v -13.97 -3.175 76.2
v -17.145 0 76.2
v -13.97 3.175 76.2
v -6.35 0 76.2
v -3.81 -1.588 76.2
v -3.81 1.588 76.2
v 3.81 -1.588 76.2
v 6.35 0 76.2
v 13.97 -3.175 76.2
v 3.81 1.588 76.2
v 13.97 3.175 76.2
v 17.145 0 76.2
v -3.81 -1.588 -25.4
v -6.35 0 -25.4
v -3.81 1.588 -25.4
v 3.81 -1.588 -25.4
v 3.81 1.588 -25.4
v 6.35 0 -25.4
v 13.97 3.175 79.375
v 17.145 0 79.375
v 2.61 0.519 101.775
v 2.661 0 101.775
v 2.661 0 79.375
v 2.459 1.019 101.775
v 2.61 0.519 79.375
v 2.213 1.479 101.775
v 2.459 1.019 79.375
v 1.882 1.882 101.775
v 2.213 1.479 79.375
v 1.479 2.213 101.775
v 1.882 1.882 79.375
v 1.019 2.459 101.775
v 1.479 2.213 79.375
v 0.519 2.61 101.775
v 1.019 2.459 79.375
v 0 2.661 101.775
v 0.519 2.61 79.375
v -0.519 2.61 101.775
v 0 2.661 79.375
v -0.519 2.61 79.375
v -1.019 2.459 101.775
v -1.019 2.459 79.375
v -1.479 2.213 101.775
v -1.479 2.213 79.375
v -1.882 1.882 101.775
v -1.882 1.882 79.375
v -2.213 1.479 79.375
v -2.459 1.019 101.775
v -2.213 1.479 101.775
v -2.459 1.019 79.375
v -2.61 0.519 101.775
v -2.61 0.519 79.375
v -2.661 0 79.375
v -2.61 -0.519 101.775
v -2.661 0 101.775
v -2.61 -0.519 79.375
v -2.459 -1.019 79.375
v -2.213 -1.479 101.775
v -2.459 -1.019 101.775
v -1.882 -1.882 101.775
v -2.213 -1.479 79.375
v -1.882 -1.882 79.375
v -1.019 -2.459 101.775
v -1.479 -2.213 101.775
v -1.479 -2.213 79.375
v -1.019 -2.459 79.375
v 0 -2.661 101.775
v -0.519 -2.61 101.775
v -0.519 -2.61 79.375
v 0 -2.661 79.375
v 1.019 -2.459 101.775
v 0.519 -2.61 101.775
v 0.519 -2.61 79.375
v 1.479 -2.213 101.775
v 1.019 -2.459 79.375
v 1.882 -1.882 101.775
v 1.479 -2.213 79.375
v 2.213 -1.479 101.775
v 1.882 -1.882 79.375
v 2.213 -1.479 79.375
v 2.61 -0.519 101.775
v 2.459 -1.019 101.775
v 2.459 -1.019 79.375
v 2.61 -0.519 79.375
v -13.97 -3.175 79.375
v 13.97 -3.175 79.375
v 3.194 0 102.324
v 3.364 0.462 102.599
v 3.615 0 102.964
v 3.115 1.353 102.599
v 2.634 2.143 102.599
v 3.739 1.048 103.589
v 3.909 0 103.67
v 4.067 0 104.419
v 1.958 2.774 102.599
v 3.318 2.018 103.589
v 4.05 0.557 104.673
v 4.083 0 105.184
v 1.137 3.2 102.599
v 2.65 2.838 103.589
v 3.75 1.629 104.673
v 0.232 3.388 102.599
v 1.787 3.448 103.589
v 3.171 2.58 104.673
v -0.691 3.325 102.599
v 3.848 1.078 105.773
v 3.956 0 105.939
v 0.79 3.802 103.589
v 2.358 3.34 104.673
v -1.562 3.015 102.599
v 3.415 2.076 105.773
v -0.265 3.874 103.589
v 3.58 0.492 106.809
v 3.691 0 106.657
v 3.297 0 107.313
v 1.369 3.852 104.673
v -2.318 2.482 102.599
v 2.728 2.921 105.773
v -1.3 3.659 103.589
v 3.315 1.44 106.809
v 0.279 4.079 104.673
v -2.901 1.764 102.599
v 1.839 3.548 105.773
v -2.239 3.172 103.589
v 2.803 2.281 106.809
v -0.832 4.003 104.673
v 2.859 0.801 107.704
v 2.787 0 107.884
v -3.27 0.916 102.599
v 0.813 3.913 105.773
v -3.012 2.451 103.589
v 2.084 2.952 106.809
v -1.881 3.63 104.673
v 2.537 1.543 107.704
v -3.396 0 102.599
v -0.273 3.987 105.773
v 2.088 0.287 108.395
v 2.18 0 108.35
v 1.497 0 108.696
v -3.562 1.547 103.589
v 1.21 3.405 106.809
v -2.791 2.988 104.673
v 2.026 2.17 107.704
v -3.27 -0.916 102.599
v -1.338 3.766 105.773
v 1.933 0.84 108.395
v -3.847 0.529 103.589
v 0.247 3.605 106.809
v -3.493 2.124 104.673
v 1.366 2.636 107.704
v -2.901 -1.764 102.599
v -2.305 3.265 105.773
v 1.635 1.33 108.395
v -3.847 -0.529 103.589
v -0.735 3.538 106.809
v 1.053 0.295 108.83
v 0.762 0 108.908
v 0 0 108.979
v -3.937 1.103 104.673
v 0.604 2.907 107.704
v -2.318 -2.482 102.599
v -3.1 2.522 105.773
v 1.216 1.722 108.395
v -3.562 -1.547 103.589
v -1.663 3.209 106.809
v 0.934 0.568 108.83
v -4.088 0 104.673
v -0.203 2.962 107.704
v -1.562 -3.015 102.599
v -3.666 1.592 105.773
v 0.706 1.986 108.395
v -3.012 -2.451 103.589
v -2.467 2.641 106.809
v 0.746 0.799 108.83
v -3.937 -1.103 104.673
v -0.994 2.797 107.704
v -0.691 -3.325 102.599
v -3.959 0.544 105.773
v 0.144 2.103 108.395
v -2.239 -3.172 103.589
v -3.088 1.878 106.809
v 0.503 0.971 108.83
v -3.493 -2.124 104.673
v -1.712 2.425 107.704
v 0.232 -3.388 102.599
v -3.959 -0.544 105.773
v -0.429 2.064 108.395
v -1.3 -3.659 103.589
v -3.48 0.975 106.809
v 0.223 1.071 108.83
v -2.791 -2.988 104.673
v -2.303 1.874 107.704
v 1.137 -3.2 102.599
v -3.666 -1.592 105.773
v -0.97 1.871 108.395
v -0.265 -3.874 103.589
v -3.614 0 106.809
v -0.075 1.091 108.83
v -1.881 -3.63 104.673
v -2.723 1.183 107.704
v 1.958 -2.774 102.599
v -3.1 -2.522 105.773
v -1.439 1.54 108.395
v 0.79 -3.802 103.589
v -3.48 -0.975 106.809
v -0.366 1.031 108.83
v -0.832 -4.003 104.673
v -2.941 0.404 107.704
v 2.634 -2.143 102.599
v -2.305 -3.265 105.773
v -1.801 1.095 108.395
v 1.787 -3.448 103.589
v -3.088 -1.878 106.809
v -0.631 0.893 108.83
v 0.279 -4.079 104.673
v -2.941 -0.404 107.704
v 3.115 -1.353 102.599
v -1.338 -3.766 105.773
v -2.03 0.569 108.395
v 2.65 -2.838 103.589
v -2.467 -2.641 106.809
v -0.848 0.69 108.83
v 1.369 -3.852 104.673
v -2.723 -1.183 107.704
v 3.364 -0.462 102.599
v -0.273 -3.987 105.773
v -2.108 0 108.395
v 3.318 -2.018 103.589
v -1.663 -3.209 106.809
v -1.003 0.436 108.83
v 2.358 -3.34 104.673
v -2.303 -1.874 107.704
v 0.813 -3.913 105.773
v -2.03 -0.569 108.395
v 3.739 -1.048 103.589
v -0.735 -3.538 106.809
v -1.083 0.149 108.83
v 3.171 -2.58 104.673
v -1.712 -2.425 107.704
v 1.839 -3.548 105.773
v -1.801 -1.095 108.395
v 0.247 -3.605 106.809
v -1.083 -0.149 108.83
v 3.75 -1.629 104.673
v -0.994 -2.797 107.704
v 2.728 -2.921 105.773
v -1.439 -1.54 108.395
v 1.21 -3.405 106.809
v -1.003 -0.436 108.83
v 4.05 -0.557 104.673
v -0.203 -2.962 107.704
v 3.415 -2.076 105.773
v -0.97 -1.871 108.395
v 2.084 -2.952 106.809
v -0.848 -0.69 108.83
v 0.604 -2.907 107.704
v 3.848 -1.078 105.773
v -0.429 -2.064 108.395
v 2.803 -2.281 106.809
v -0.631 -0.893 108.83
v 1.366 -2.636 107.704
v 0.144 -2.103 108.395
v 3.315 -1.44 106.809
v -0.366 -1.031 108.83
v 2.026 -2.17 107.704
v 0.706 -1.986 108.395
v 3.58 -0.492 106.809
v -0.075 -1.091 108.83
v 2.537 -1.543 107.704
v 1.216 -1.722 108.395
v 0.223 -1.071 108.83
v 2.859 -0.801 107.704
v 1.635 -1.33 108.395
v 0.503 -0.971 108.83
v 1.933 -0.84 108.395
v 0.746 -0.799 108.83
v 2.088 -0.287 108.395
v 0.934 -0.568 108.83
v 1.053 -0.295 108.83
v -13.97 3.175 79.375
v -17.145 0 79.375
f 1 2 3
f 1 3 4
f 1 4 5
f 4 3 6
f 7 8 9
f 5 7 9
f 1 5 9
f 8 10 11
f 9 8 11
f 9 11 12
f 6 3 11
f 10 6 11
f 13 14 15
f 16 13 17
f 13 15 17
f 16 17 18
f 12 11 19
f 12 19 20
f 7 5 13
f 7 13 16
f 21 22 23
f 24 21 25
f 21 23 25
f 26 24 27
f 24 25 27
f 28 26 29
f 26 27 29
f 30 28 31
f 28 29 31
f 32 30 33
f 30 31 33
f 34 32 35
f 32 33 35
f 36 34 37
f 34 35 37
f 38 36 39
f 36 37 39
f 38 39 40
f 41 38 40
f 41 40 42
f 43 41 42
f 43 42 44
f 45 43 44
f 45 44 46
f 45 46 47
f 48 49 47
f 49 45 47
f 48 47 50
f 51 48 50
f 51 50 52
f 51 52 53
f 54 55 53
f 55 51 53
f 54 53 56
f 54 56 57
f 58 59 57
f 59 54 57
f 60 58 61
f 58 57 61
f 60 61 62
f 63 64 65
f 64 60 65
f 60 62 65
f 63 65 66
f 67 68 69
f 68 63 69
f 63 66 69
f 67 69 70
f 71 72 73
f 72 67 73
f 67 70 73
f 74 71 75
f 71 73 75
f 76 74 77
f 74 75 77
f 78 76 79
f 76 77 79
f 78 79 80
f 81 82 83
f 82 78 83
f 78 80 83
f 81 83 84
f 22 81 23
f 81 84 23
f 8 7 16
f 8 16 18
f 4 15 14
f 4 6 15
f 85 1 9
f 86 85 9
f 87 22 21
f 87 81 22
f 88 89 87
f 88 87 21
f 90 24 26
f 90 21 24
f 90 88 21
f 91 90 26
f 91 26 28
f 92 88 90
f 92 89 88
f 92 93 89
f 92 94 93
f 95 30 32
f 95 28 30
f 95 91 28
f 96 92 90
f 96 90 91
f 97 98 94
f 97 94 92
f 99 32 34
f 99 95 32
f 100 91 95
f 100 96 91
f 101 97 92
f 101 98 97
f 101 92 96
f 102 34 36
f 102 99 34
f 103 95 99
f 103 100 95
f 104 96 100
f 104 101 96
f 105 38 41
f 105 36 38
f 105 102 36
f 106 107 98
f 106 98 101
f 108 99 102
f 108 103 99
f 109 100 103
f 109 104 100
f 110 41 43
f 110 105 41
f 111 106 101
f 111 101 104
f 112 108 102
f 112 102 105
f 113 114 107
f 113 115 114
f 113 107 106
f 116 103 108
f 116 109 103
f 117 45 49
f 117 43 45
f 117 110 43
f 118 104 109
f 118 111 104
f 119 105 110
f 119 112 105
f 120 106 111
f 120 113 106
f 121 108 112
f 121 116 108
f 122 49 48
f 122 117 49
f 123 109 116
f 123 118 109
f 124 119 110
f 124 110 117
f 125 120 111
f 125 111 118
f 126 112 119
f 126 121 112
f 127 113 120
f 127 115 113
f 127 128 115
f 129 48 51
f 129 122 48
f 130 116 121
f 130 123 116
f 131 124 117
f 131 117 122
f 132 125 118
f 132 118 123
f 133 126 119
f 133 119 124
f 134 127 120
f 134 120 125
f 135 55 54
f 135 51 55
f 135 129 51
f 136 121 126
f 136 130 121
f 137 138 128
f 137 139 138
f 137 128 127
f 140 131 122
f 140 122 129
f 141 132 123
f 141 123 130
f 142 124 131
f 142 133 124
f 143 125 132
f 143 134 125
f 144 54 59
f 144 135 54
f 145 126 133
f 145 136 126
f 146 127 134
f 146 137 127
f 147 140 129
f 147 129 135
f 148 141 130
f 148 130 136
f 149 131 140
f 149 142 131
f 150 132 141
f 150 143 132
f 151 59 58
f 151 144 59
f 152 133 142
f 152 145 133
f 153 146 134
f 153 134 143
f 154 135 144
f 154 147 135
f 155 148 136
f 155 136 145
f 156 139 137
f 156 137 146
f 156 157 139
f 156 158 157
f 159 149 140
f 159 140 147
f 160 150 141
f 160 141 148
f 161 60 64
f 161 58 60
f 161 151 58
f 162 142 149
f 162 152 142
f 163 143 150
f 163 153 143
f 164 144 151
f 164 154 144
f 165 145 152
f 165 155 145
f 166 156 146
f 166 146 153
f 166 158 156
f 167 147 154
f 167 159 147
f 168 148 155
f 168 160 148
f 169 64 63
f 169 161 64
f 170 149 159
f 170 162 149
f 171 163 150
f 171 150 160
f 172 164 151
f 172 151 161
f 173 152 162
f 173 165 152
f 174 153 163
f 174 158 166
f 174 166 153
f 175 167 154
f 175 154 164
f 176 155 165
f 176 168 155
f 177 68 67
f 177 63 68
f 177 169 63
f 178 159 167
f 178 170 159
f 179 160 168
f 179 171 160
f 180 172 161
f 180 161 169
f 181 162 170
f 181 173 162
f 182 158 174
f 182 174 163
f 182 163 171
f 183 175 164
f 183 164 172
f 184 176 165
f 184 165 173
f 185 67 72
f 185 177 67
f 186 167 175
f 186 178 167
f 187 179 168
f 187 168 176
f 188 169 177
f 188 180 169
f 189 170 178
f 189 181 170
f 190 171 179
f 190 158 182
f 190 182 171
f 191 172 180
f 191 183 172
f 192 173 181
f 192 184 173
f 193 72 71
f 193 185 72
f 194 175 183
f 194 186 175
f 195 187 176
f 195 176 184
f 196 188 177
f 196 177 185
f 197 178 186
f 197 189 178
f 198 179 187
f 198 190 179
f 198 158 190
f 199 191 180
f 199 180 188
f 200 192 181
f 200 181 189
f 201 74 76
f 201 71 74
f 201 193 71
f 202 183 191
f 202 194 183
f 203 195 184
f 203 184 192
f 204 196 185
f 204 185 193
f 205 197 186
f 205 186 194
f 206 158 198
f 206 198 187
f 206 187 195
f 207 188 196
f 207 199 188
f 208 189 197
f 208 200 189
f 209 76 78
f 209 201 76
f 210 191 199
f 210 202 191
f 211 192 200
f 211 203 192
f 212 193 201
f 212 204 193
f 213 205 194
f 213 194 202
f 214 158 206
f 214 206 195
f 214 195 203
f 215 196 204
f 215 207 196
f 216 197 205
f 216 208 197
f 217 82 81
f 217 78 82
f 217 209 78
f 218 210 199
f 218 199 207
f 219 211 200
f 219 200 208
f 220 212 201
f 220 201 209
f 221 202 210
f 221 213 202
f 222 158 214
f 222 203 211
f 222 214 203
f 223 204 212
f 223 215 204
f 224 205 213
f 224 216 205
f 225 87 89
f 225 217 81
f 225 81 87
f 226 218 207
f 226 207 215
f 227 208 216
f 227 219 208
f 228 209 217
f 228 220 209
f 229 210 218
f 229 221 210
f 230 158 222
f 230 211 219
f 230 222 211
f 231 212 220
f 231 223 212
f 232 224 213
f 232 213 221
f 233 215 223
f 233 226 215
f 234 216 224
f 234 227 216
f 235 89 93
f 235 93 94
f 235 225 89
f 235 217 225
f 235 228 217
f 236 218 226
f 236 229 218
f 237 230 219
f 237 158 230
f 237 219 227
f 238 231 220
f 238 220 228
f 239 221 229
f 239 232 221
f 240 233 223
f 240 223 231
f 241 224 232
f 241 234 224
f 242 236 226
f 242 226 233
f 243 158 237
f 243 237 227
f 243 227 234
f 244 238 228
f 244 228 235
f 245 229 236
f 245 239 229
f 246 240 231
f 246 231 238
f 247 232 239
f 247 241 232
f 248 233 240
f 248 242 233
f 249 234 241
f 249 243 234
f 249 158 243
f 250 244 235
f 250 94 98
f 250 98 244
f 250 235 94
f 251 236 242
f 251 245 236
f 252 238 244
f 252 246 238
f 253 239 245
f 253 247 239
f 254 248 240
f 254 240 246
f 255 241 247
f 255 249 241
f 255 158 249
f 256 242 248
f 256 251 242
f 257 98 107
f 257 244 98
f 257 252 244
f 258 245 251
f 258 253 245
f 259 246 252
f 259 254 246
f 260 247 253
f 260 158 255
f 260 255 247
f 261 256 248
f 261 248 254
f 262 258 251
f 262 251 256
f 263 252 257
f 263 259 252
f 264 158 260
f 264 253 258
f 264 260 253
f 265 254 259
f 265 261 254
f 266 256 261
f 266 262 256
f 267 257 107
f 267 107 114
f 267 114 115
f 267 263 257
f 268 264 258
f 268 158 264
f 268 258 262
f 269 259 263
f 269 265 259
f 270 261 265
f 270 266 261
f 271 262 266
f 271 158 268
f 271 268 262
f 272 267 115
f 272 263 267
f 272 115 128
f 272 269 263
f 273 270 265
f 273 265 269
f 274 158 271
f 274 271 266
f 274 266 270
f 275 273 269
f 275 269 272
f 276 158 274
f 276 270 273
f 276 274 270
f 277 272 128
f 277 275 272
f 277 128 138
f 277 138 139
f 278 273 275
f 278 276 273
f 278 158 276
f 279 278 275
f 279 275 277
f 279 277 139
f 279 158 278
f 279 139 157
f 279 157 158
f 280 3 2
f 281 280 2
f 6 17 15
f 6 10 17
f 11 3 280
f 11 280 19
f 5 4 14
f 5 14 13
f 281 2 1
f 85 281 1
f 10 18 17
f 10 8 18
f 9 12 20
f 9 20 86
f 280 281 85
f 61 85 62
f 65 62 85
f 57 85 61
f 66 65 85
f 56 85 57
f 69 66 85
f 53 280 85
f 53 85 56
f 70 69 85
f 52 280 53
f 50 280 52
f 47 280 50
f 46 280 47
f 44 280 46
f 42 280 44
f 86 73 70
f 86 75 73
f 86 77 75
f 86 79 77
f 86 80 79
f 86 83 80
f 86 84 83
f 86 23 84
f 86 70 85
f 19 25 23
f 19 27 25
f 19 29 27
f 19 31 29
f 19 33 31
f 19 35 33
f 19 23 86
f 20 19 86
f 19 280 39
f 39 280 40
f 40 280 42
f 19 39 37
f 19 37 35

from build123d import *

# Parameters (mm, degrees)
F1_DEPTH    = 76.2
F2_W        = 38.1
F2_H        = 6.35
F3_DEPTH    = 3.175
F4_T1_DEPTH = 29.3032991577
F5_R        = 2.6614768155
F6_DEPTH    = 25.4
F10_DEPTH   = 25.4


# Not quite as in the source:
# - a fillet or chamfer that OpenCascade refuses, or shapes differently, is made with other operations: its cross-section is extruded or revolved along the edge and cut away or added


with BuildPart() as f1:
    # F0 (on Top) → F1 (new body)
    with BuildSketch(Plane.XY):
        Polygon((0, 1.5875), (-3.81, 1.5875), (-6.35, 0), (-3.81, -1.5875), (0, -1.5875), (3.81, -1.5875), (6.35, 0), (3.81, 1.5875), align=None)
    extrude(amount=F1_DEPTH)

    # F2 (on face) → F3 (join)
    with BuildSketch(Plane.XY.offset(76.2)):
        Rectangle(F2_W, F2_H)
    extrude(amount=F3_DEPTH)

    # F4: chamfer of 5.08 on 4 edges, made by hand

    # F4_s2 → F4_t1 (cut)
    with BuildSketch(Plane.XY.offset(63.1358504211)):
        Polygon((19.05, 1.905), (13.97, -3.175), (19.05, -3.175), align=None)
        Polygon((13.97, 3.175), (19.05, -1.905), (19.05, 3.175), align=None)
        Polygon((-19.05, 1.905), (-13.97, -3.175), (-19.05, -3.175), align=None)
        Polygon((-13.97, 3.175), (-19.05, -1.905), (-19.05, 3.175), align=None)
    extrude(amount=F4_T1_DEPTH, mode=Mode.SUBTRACT)

    # F5 (on face) → F6 (join)
    with BuildSketch(Plane.XY.offset(79.375)):
        Circle(F5_R)
    extrude(amount=F6_DEPTH)

    # F7 (on Front) → F9 (revolve)
    with BuildSketch(Plane.XZ):
        with BuildLine():
            Line((0, 108.979212298), (0, 100.7914969782))
            ThreePointArc((0, 100.7914969782), (4.0938576599, 104.8853546381), (0, 108.979212298))
        make_face()
    revolve(axis=Axis((0, 0, 105.8157756925), (0, 0, 1)))

    # F10 (add): a face of the model
    f10_faces = [f1.faces().sort_by_distance(p)[0] for p in [
        (0, 0, 0),
    ]]
    extrude(f10_faces, amount=F10_DEPTH)


solid = f1.part
